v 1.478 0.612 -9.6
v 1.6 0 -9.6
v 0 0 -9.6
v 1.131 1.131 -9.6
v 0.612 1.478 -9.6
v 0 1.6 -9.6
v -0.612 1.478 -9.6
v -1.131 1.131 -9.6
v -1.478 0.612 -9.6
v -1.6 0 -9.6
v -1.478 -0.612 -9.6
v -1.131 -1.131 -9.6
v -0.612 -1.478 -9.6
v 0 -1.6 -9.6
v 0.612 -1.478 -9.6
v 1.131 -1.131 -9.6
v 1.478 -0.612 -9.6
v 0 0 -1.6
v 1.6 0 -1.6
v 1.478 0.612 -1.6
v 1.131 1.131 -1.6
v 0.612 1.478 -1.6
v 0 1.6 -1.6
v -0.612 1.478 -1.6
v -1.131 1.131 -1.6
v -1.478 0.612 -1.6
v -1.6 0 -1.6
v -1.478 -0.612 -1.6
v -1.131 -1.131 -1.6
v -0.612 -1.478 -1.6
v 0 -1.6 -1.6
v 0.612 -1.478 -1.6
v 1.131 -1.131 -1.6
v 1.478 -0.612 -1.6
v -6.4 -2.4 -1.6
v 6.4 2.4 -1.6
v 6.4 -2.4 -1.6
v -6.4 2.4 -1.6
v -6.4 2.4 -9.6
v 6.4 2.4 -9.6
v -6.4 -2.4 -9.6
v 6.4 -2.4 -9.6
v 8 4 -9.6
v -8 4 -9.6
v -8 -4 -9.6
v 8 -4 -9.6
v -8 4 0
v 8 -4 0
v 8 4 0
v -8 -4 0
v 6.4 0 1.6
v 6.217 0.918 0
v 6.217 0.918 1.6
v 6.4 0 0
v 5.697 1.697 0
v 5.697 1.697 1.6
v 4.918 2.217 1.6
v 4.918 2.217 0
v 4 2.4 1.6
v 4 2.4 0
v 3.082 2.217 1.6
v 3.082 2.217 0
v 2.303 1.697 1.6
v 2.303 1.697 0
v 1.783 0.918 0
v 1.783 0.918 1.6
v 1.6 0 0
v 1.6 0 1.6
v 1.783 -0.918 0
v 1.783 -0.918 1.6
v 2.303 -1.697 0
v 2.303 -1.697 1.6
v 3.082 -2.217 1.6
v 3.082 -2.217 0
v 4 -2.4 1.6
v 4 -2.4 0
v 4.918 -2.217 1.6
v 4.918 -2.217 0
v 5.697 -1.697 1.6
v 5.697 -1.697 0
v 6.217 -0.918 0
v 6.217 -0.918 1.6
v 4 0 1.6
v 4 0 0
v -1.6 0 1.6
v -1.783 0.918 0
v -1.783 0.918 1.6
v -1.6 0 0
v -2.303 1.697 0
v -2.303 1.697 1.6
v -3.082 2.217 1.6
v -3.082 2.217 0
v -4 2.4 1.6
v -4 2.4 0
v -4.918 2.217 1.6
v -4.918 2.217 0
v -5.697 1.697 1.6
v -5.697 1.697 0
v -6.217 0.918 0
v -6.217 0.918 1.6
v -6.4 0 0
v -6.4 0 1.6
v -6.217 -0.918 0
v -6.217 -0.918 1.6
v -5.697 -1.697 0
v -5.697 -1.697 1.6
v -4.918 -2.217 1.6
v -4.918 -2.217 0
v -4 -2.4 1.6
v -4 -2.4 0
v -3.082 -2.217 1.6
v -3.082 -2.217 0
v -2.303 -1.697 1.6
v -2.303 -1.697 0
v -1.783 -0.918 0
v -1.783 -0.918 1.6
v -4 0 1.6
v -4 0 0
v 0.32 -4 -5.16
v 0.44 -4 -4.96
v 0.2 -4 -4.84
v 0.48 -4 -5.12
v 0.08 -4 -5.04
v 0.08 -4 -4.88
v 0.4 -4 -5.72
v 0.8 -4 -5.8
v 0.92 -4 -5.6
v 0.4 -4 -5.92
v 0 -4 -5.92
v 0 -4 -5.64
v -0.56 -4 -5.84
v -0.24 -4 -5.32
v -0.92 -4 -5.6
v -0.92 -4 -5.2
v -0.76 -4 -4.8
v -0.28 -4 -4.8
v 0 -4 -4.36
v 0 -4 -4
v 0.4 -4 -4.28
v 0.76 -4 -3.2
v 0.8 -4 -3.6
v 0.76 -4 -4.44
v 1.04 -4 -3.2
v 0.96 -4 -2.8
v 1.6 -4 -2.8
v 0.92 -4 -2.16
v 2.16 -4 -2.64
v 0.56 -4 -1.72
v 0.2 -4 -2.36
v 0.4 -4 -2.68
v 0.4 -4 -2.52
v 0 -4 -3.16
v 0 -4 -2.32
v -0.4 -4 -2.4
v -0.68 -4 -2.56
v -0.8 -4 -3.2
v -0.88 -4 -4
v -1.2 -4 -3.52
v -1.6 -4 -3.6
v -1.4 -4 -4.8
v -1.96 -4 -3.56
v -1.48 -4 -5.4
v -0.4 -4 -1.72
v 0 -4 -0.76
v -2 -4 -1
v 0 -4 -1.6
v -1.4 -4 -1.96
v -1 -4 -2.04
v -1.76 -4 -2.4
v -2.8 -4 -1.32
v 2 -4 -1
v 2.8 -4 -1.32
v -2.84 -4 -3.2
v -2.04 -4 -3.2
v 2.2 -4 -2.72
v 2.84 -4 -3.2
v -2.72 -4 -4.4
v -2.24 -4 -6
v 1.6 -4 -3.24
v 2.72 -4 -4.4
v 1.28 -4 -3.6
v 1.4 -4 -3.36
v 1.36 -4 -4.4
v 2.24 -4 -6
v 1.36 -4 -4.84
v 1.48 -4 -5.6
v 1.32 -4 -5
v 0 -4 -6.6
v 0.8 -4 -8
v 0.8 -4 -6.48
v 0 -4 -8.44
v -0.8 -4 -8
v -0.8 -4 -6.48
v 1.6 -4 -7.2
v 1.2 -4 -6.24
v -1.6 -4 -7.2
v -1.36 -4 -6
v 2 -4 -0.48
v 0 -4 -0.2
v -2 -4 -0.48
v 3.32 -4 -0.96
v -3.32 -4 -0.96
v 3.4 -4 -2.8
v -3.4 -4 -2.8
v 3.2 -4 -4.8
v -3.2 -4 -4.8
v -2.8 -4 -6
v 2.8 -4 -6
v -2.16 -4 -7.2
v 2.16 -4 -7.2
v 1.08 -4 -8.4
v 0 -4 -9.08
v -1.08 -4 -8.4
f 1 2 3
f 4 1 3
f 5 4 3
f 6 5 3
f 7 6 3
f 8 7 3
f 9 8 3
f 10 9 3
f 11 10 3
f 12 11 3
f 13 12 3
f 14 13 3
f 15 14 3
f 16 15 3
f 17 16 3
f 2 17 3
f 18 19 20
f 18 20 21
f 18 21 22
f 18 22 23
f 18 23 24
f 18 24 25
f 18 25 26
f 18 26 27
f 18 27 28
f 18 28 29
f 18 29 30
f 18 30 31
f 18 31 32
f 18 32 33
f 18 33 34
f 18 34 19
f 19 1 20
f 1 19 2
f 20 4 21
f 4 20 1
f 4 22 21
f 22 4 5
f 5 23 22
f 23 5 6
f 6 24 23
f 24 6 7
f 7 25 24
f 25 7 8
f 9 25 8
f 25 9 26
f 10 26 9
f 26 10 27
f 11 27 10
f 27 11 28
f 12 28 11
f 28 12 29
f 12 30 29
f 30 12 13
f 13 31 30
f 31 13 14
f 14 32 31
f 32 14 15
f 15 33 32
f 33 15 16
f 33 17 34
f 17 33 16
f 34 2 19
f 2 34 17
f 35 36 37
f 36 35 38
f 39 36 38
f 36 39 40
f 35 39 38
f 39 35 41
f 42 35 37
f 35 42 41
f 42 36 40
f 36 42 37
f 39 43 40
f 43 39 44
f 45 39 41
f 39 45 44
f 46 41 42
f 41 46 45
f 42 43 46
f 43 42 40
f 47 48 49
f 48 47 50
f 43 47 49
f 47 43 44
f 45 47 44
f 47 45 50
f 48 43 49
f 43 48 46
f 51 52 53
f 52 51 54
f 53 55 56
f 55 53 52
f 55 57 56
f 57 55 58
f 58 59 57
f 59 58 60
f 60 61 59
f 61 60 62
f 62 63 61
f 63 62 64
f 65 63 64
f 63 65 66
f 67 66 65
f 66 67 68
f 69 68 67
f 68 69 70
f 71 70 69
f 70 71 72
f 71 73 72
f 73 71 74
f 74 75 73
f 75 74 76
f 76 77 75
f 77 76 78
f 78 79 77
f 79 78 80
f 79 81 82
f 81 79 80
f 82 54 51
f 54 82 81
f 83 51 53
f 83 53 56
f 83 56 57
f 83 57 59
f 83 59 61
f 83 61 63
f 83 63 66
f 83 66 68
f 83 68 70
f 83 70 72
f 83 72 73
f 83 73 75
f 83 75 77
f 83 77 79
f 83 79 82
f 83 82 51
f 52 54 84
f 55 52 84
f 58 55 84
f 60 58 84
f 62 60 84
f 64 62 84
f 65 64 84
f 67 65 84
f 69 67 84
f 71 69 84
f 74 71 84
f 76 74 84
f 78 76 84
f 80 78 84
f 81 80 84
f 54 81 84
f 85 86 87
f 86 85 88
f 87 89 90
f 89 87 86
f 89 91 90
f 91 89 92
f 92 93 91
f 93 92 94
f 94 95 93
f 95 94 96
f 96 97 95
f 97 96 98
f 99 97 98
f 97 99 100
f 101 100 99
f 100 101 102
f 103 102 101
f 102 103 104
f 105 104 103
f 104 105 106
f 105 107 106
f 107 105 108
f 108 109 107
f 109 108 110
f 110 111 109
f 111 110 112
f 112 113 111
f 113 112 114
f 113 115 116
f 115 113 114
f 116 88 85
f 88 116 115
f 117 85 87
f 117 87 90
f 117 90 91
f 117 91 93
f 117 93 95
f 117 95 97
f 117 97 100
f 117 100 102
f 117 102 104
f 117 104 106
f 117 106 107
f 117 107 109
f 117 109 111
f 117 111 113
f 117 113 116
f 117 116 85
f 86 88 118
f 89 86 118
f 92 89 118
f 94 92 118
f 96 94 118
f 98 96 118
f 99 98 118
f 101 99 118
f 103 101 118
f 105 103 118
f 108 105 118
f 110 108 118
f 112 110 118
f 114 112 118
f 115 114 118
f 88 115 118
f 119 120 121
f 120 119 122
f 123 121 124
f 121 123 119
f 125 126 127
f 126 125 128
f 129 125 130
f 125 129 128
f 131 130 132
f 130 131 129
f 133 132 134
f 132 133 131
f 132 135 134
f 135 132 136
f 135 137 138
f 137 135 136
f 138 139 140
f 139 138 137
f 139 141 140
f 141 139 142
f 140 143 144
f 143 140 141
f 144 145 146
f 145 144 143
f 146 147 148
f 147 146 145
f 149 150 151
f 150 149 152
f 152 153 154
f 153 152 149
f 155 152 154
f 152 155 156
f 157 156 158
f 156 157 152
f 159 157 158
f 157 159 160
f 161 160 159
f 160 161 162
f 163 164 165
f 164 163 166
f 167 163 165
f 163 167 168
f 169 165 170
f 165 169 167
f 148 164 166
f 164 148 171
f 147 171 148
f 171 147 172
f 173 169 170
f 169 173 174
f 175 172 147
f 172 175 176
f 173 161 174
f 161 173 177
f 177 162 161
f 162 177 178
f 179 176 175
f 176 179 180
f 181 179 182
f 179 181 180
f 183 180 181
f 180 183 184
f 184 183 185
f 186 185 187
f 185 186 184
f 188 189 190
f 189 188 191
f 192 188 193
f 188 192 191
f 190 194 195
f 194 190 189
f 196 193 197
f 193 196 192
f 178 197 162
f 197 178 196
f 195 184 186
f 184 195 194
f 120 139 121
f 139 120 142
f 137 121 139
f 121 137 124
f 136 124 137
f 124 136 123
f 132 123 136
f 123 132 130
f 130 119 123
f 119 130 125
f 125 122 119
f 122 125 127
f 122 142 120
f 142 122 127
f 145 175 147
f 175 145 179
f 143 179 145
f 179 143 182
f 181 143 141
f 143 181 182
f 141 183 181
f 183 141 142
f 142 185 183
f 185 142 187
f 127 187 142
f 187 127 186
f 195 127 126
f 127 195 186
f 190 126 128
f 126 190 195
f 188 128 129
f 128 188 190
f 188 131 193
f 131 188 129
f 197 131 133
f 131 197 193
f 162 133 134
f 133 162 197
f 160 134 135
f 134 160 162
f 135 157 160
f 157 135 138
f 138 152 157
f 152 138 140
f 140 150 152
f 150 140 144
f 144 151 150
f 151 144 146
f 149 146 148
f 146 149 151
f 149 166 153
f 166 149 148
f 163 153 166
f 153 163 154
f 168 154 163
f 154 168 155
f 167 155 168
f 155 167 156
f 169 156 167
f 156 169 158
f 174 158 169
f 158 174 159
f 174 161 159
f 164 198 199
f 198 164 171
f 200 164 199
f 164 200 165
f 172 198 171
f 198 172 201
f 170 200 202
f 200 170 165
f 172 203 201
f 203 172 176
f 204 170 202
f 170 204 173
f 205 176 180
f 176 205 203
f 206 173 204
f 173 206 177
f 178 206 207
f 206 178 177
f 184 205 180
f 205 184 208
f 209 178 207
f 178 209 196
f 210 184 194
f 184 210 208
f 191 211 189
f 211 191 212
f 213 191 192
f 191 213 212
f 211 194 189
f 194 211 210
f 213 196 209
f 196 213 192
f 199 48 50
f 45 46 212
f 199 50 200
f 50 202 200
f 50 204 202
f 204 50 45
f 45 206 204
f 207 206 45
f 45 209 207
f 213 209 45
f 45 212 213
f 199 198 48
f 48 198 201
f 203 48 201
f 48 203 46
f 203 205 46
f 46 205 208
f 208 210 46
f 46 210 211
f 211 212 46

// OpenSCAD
// file: ../p/4-4edge.scad
use <../lib.scad>
function ldraw_lib__4_4edge() = [
// 0 Circle 1.0
// 0 Name: 4-4edge.dat
// 0 Author: James Jessiman
// 0 !LDRAW_ORG Primitive UPDATE 2017-01
// 0 !LICENSE Licensed under CC BY 2.0 and CC BY 4.0 : see CAreadme.txt
// 
// 0 BFC CERTIFY CCW
  [0,"BFC","CERTIFY"],
  [0,"BFC","CCW"],
// 
// 0 !HISTORY 1998-12-15 [PTadmin] Official Update 1998-10
// 0 !HISTORY 2005-12-28 [PTadmin] Official Update 2005-01
// 0 !HISTORY 2007-06-24 [PTadmin] Header formatted for Contributor Agreement
// 0 !HISTORY 2008-07-01 [PTadmin] Official Update 2008-01
// 0 !HISTORY 2017-01-15 [Steffen] BFCed
// 0 !HISTORY 2017-12-30 [PTadmin] Official Update 2017-01
// 
// 
// 2 24 1 0 0 0.9239 0 0.3827
  [2,24,1,0,0,0.9239,0,0.3827],
// 2 24 0.9239 0 0.3827 0.7071 0 0.7071
  [2,24,0.9239,0,0.3827,0.7071,0,0.7071],
// 2 24 0.7071 0 0.7071 0.3827 0 0.9239
  [2,24,0.7071,0,0.7071,0.3827,0,0.9239],
// 2 24 0.3827 0 0.9239 0 0 1
  [2,24,0.3827,0,0.9239,0,0,1],
// 2 24 0 0 1 -0.3827 0 0.9239
  [2,24,0,0,1,-0.3827,0,0.9239],
// 2 24 -0.3827 0 0.9239 -0.7071 0 0.7071
  [2,24,-0.3827,0,0.9239,-0.7071,0,0.7071],
// 2 24 -0.7071 0 0.7071 -0.9239 0 0.3827
  [2,24,-0.7071,0,0.7071,-0.9239,0,0.3827],
// 2 24 -0.9239 0 0.3827 -1 0 -0
  [2,24,-0.9239,0,0.3827,-1,0,-0],
// 2 24 -1 0 -0 -0.9239 0 -0.3827
  [2,24,-1,0,-0,-0.9239,0,-0.3827],
// 2 24 -0.9239 0 -0.3827 -0.7071 0 -0.7071
  [2,24,-0.9239,0,-0.3827,-0.7071,0,-0.7071],
// 2 24 -0.7071 0 -0.7071 -0.3827 0 -0.9239
  [2,24,-0.7071,0,-0.7071,-0.3827,0,-0.9239],
// 2 24 -0.3827 0 -0.9239 0 0 -1
  [2,24,-0.3827,0,-0.9239,0,0,-1],
// 2 24 0 0 -1 0.3827 0 -0.9239
  [2,24,0,0,-1,0.3827,0,-0.9239],
// 2 24 0.3827 0 -0.9239 0.7071 0 -0.7071
  [2,24,0.3827,0,-0.9239,0.7071,0,-0.7071],
// 2 24 0.7071 0 -0.7071 0.9239 0 -0.3827
  [2,24,0.7071,0,-0.7071,0.9239,0,-0.3827],
// 2 24 0.9239 0 -0.3827 1 0 0
  [2,24,0.9239,0,-0.3827,1,0,0],
];
module ldraw_lib__4_4edge(step=0, col=false, unit=2/5, alt=false, line=0.2, solid=!$preview)
    makepoly(ldraw_lib__4_4edge(), step=step, col=col, unit=unit, alt=alt, line=line, solid=solid);
ldraw_lib__4_4edge(line=0.2);
// file: ../p/4-4disc.scad
use <../lib.scad>
function ldraw_lib__4_4disc() = [
// 0 Disc 1.0
// 0 Name: 4-4disc.dat
// 0 Author: James Jessiman
// 0 !LDRAW_ORG Primitive UPDATE 2002-02
// 0 !LICENSE Licensed under CC BY 2.0 and CC BY 4.0 : see CAreadme.txt
// 
// 0 BFC CERTIFY CCW
  [0,"BFC","CERTIFY"],
  [0,"BFC","CCW"],
// 
// 0 !HISTORY 1998-12-15 [PTadmin] Official Update 1998-10
// 0 !HISTORY 2002-03-23 [sbliss] Added BFC statement
// 0 !HISTORY 2002-04-25 [PTadmin] Official Update 2002-02
// 0 !HISTORY 2007-06-24 [PTadmin] Header formatted for Contributor Agreement
// 0 !HISTORY 2008-07-01 [PTadmin] Official Update 2008-01
// 
// 
// 3 16 0 0 0 1 0 0 0.9239 0 0.3827
  [3,16,0,0,0,1,0,0,0.9239,0,0.3827],
// 3 16 0 0 0 0.9239 0 0.3827 0.7071 0 0.7071
  [3,16,0,0,0,0.9239,0,0.3827,0.7071,0,0.7071],
// 3 16 0 0 0 0.7071 0 0.7071 0.3827 0 0.9239
  [3,16,0,0,0,0.7071,0,0.7071,0.3827,0,0.9239],
// 3 16 0 0 0 0.3827 0 0.9239 0 0 1
  [3,16,0,0,0,0.3827,0,0.9239,0,0,1],
// 3 16 0 0 0 0 0 1 -0.3827 0 0.9239
  [3,16,0,0,0,0,0,1,-0.3827,0,0.9239],
// 3 16 0 0 0 -0.3827 0 0.9239 -0.7071 0 0.7071
  [3,16,0,0,0,-0.3827,0,0.9239,-0.7071,0,0.7071],
// 3 16 0 0 0 -0.7071 0 0.7071 -0.9239 0 0.3827
  [3,16,0,0,0,-0.7071,0,0.7071,-0.9239,0,0.3827],
// 3 16 0 0 0 -0.9239 0 0.3827 -1 0 -0
  [3,16,0,0,0,-0.9239,0,0.3827,-1,0,-0],
// 3 16 0 0 0 -1 0 -0 -0.9239 0 -0.3827
  [3,16,0,0,0,-1,0,-0,-0.9239,0,-0.3827],
// 3 16 0 0 0 -0.9239 0 -0.3827 -0.7071 0 -0.7071
  [3,16,0,0,0,-0.9239,0,-0.3827,-0.7071,0,-0.7071],
// 3 16 0 0 0 -0.7071 0 -0.7071 -0.3827 0 -0.9239
  [3,16,0,0,0,-0.7071,0,-0.7071,-0.3827,0,-0.9239],
// 3 16 0 0 0 -0.3827 0 -0.9239 0 0 -1
  [3,16,0,0,0,-0.3827,0,-0.9239,0,0,-1],
// 3 16 0 0 0 0 0 -1 0.3827 0 -0.9239
  [3,16,0,0,0,0,0,-1,0.3827,0,-0.9239],
// 3 16 0 0 0 0.3827 0 -0.9239 0.7071 0 -0.7071
  [3,16,0,0,0,0.3827,0,-0.9239,0.7071,0,-0.7071],
// 3 16 0 0 0 0.7071 0 -0.7071 0.9239 0 -0.3827
  [3,16,0,0,0,0.7071,0,-0.7071,0.9239,0,-0.3827],
// 3 16 0 0 0 0.9239 0 -0.3827 1 0 0
  [3,16,0,0,0,0.9239,0,-0.3827,1,0,0],
// 0
];
module ldraw_lib__4_4disc(step=0, col=false, unit=2/5, alt=false, line=0.2, solid=!$preview)
    makepoly(ldraw_lib__4_4disc(), step=step, col=col, unit=unit, alt=alt, line=line, solid=solid);
ldraw_lib__4_4disc(line=0.2);
// file: ../p/4-4cyli.scad
use <../lib.scad>
$fa=1; $fs=0.2;
function ldraw_lib__4_4cyli(realsolid=false) = [
// 0 Cylinder 1.0
// 0 Name: 4-4cyli.dat
// 0 Author: James Jessiman
// 0 !LDRAW_ORG Primitive UPDATE 2005-01
// 0 !LICENSE Licensed under CC BY 2.0 and CC BY 4.0 : see CAreadme.txt
// 
// 0 BFC CERTIFY CCW
  [0,"BFC","CERTIFY"],
  [0,"BFC","CCW"],
// 
// 0 !HISTORY 1998-12-15 [PTadmin] Official Update 1998-10
// 0 !HISTORY 2002-03-23 [sbliss] Added BFC statement; merged headers from files in distributions LDraw 0.27 and Complete.
// 0 !HISTORY 2002-04-25 [PTadmin] Official Update 2002-02
// 0 !HISTORY 2004-12-14 [guyvivan] BFC CCW
// 0 !HISTORY 2005-12-28 [PTadmin] Official Update 2005-01
// 0 !HISTORY 2007-06-24 [PTadmin] Header formatted for Contributor Agreement
// 0 !HISTORY 2008-07-01 [PTadmin] Official Update 2008-01
// 
// 
// 4 16 1 1 0 0.9239 1 0.3827 0.9239 0 0.3827 1 0 0
  [4,16,1,1,0,0.9239,1,0.3827,0.9239,0,0.3827,1,0,0],
// 5 24 1 0 0 1 1 0 0.9239 0 0.3827 0.9239 0 -0.3827
  [5,24,1,0,0,1,1,0,0.9239,0,0.3827,0.9239,0,-0.3827],
// 4 16 0.9239 1 0.3827 0.7071 1 0.7071 0.7071 0 0.7071 0.9239 0 0.3827
  [4,16,0.9239,1,0.3827,0.7071,1,0.7071,0.7071,0,0.7071,0.9239,0,0.3827],
// 5 24 0.9239 0 0.3827 0.9239 1 0.3827 0.7071 0 0.7071 1 0 0
  [5,24,0.9239,0,0.3827,0.9239,1,0.3827,0.7071,0,0.7071,1,0,0],
// 4 16 0.7071 1 0.7071 0.3827 1 0.9239 0.3827 0 0.9239 0.7071 0 0.7071
  [4,16,0.7071,1,0.7071,0.3827,1,0.9239,0.3827,0,0.9239,0.7071,0,0.7071],
// 5 24 0.7071 0 0.7071 0.7071 1 0.7071 0.3827 0 0.9239 0.9239 0 0.3827
  [5,24,0.7071,0,0.7071,0.7071,1,0.7071,0.3827,0,0.9239,0.9239,0,0.3827],
// 4 16 0.3827 1 0.9239 0 1 1 0 0 1 0.3827 0 0.9239
  [4,16,0.3827,1,0.9239,0,1,1,0,0,1,0.3827,0,0.9239],
// 5 24 0.3827 0 0.9239 0.3827 1 0.9239 0 0 1 0.7071 0 0.7071
  [5,24,0.3827,0,0.9239,0.3827,1,0.9239,0,0,1,0.7071,0,0.7071],
// 4 16 0 1 1 -0.3827 1 0.9239 -0.3827 0 0.9239 0 0 1
  [4,16,0,1,1,-0.3827,1,0.9239,-0.3827,0,0.9239,0,0,1],
// 5 24 0 0 1 0 1 1 -0.3827 0 0.9239 0.3827 0 0.9239
  [5,24,0,0,1,0,1,1,-0.3827,0,0.9239,0.3827,0,0.9239],
// 4 16 -0.3827 1 0.9239 -0.7071 1 0.7071 -0.7071 0 0.7071 -0.3827 0 0.9239
  [4,16,-0.3827,1,0.9239,-0.7071,1,0.7071,-0.7071,0,0.7071,-0.3827,0,0.9239],
// 5 24 -0.3827 0 0.9239 -0.3827 1 0.9239 -0.7071 0 0.7071 0 0 1
  [5,24,-0.3827,0,0.9239,-0.3827,1,0.9239,-0.7071,0,0.7071,0,0,1],
// 4 16 -0.7071 1 0.7071 -0.9239 1 0.3827 -0.9239 0 0.3827 -0.7071 0 0.7071
  [4,16,-0.7071,1,0.7071,-0.9239,1,0.3827,-0.9239,0,0.3827,-0.7071,0,0.7071],
// 5 24 -0.7071 0 0.7071 -0.7071 1 0.7071 -0.9239 0 0.3827 -0.3827 0 0.9239
  [5,24,-0.7071,0,0.7071,-0.7071,1,0.7071,-0.9239,0,0.3827,-0.3827,0,0.9239],
// 4 16 -0.9239 1 0.3827 -1 1 0 -1 0 0 -0.9239 0 0.3827
  [4,16,-0.9239,1,0.3827,-1,1,0,-1,0,0,-0.9239,0,0.3827],
// 5 24 -0.9239 0 0.3827 -0.9239 1 0.3827 -1 0 0 -0.7071 0 0.7071
  [5,24,-0.9239,0,0.3827,-0.9239,1,0.3827,-1,0,0,-0.7071,0,0.7071],
// 4 16 -1 1 0 -0.9239 1 -0.3827 -0.9239 0 -0.3827 -1 0 0
  [4,16,-1,1,0,-0.9239,1,-0.3827,-0.9239,0,-0.3827,-1,0,0],
// 5 24 -1 0 0 -1 1 0 -0.9239 0 -0.3827 -0.9239 0 0.3827
  [5,24,-1,0,0,-1,1,0,-0.9239,0,-0.3827,-0.9239,0,0.3827],
// 4 16 -0.9239 1 -0.3827 -0.7071 1 -0.7071 -0.7071 0 -0.7071 -0.9239 0 -0.3827
  [4,16,-0.9239,1,-0.3827,-0.7071,1,-0.7071,-0.7071,0,-0.7071,-0.9239,0,-0.3827],
// 5 24 -0.9239 0 -0.3827 -0.9239 1 -0.3827 -0.7071 0 -0.7071 -1 0 0
  [5,24,-0.9239,0,-0.3827,-0.9239,1,-0.3827,-0.7071,0,-0.7071,-1,0,0],
// 4 16 -0.7071 1 -0.7071 -0.3827 1 -0.9239 -0.3827 0 -0.9239 -0.7071 0 -0.7071
  [4,16,-0.7071,1,-0.7071,-0.3827,1,-0.9239,-0.3827,0,-0.9239,-0.7071,0,-0.7071],
// 5 24 -0.7071 0 -0.7071 -0.7071 1 -0.7071 -0.3827 0 -0.9239 -0.9239 0 -0.3827
  [5,24,-0.7071,0,-0.7071,-0.7071,1,-0.7071,-0.3827,0,-0.9239,-0.9239,0,-0.3827],
// 4 16 -0.3827 1 -0.9239 0 1 -1 0 0 -1 -0.3827 0 -0.9239
  [4,16,-0.3827,1,-0.9239,0,1,-1,0,0,-1,-0.3827,0,-0.9239],
// 5 24 -0.3827 0 -0.9239 -0.3827 1 -0.9239 0 0 -1 -0.7071 0 -0.7071
  [5,24,-0.3827,0,-0.9239,-0.3827,1,-0.9239,0,0,-1,-0.7071,0,-0.7071],
// 4 16 0 1 -1 0.3827 1 -0.9239 0.3827 0 -0.9239 0 0 -1
  [4,16,0,1,-1,0.3827,1,-0.9239,0.3827,0,-0.9239,0,0,-1],
// 5 24 0 0 -1 0 1 -1 0.3827 0 -0.9239 -0.3827 0 -0.9239
  [5,24,0,0,-1,0,1,-1,0.3827,0,-0.9239,-0.3827,0,-0.9239],
// 4 16 0.3827 1 -0.9239 0.7071 1 -0.7071 0.7071 0 -0.7071 0.3827 0 -0.9239
  [4,16,0.3827,1,-0.9239,0.7071,1,-0.7071,0.7071,0,-0.7071,0.3827,0,-0.9239],
// 5 24 0.3827 0 -0.9239 0.3827 1 -0.9239 0.7071 0 -0.7071 0 0 -1
  [5,24,0.3827,0,-0.9239,0.3827,1,-0.9239,0.7071,0,-0.7071,0,0,-1],
// 4 16 0.7071 1 -0.7071 0.9239 1 -0.3827 0.9239 0 -0.3827 0.7071 0 -0.7071
  [4,16,0.7071,1,-0.7071,0.9239,1,-0.3827,0.9239,0,-0.3827,0.7071,0,-0.7071],
// 5 24 0.7071 0 -0.7071 0.7071 1 -0.7071 0.9239 0 -0.3827 0.3827 0 -0.9239
  [5,24,0.7071,0,-0.7071,0.7071,1,-0.7071,0.9239,0,-0.3827,0.3827,0,-0.9239],
// 4 16 0.9239 1 -0.3827 1 1 0 1 0 0 0.9239 0 -0.3827
  [4,16,0.9239,1,-0.3827,1,1,0,1,0,0,0.9239,0,-0.3827],
// 5 24 0.9239 0 -0.3827 0.9239 1 -0.3827 1 0 0 0.7071 0 -0.7071
  [5,24,0.9239,0,-0.3827,0.9239,1,-0.3827,1,0,0,0.7071,0,-0.7071],
// 0
];
module ldraw_lib__4_4cyli(step=0, col=false, unit=2/5, alt=false, line=0.2, solid=!$preview)
    makepoly(ldraw_lib__4_4cyli(solid), step=step, col=col, unit=unit, alt=alt, line=line, solid=solid);
ldraw_lib__4_4cyli(line=0.2);
// file: ../p/stud3.scad
use <../lib.scad>
use <4-4cyli.scad>
use <4-4disc.scad>
use <4-4edge.scad>
function ldraw_lib__stud3() = [
// 0 Stud Tube Solid
// 0 Name: stud3.dat
// 0 Author: James Jessiman
// 0 !LDRAW_ORG Primitive UPDATE 2012-01
// 0 !LICENSE Licensed under CC BY 4.0 : see CAreadme.txt
// 
// 0 BFC CERTIFY CCW
  [0,"BFC","CERTIFY"],
  [0,"BFC","CCW"],
// 
// 0 !HISTORY 2002-04-04 [sbliss] Modified for BFC compliance
// 0 !HISTORY 2002-04-25 [PTadmin] Official Update 2002-02
// 0 !HISTORY 2007-06-24 [PTadmin] Header formatted for Contributor Agreement
// 0 !HISTORY 2008-07-01 [PTadmin] Official Update 2008-01
// 0 !HISTORY 2012-02-16 [Philo] Changed to CCW
// 0 !HISTORY 2012-03-30 [PTadmin] Official Update 2012-01
// 
// 
// 1 16 0 -4 0 4 0 0 0 1 0 0 0 4 4-4edge.dat
  [1,16,0,-4,0,4,0,0,0,1,0,0,0,4, ldraw_lib__4_4edge()],
// 1 16 0 0 0 4 0 0 0 1 0 0 0 4 4-4edge.dat
  [1,16,0,0,0,4,0,0,0,1,0,0,0,4, ldraw_lib__4_4edge()],
// 1 16 0 -4 0 4 0 0 0 1 0 0 0 4 4-4disc.dat
  [1,16,0,-4,0,4,0,0,0,1,0,0,0,4, ldraw_lib__4_4disc()],
  [-1,16,0,0,0,4,0,0,0,-1,0,0,0,4, ldraw_lib__4_4disc()],
// 1 16 0 -4 0 4 0 0 0 4 0 0 0 4 4-4cyli.dat
  [1,16,0,-4,0,4,0,0,0,4,0,0,0,4, ldraw_lib__4_4cyli()],
];
module ldraw_lib__stud3(step=0, col=false, unit=2/5, alt=false, line=0.2, solid=!$preview)
    makepoly(ldraw_lib__stud3(), step=step, col=col, unit=unit, alt=alt, line=line, solid=solid);
ldraw_lib__stud3(line=0.2);
// file: ../p/stud.scad
use <../lib.scad>
use <4-4cyli.scad>
use <4-4disc.scad>
use <4-4edge.scad>
function ldraw_lib__stud() = [
// 0 Stud
// 0 Name: stud.dat
// 0 Author: James Jessiman
// 0 !LDRAW_ORG Primitive UPDATE 2012-01
// 0 !LICENSE Licensed under CC BY 4.0 : see CAreadme.txt
// 
// 0 BFC CERTIFY CCW
  [0,"BFC","CERTIFY"],
  [0,"BFC","CCW"],
// 
// 0 !HISTORY 2002-04-04 [sbliss] Modified for BFC compliance
// 0 !HISTORY 2002-04-25 [PTadmin] Official Update 2002-02
// 0 !HISTORY 2007-06-24 [PTadmin] Header formatted for Contributor Agreement
// 0 !HISTORY 2008-07-01 [PTadmin] Official Update 2008-01
// 0 !HISTORY 2012-02-16 [Philo] Changed to CCW
// 0 !HISTORY 2012-03-30 [PTadmin] Official Update 2012-01
// 
// 
// 1 16 0 0 0 6 0 0 0 1 0 0 0 6 4-4edge.dat
  [1,16,0,0,0,6,0,0,0,1,0,0,0,6, ldraw_lib__4_4edge()],
// 1 16 0 -4 0 6 0 0 0 1 0 0 0 6 4-4edge.dat
  [1,16,0,-4,0,6,0,0,0,1,0,0,0,6, ldraw_lib__4_4edge()],
// 1 16 0 0 0 6 0 0 0 -4 0 0 0 6 4-4cyli.dat
  [1,16,0,0,0,6,0,0,0,-4,0,0,0,6, ldraw_lib__4_4cyli()],
// 1 16 0 -4 0 6 0 0 0 1 0 0 0 6 4-4disc.dat
  [1,16,0,-4,0,6,0,0,0,1,0,0,0,6, ldraw_lib__4_4disc()],
  [-1,16,0,0,0,6,0,0,0,-1,0,0,0,6, ldraw_lib__4_4disc()],
];
module ldraw_lib__stud(step=0, col=false, unit=2/5, alt=false, line=0.2, solid=!$preview)
    makepoly(ldraw_lib__stud(), step=step, col=col, unit=unit, alt=alt, line=line, solid=solid);
ldraw_lib__stud(line=0.2);
// file: ../p/box5.scad
use <../lib.scad>
function ldraw_lib__box5() = [
// 0 Box with 5 Faces and All Edges
// 0 Name: box5.dat
// 0 Author: James Jessiman
// 0 !LDRAW_ORG Primitive UPDATE 2012-01
// 0 !LICENSE Licensed under CC BY 2.0 and CC BY 4.0 : see CAreadme.txt
// 
// 0 BFC CERTIFY CCW
  [0,"BFC","CERTIFY"],
  [0,"BFC","CCW"],
// 
// 0 !HISTORY 2002-04-03 [sbliss] Modified for BFC compliance
// 0 !HISTORY 2002-04-25 [PTadmin] Official Update 2002-02
// 0 !HISTORY 2007-06-24 [PTadmin] Header formatted for Contributor Agreement
// 0 !HISTORY 2008-07-01 [PTadmin] Official Update 2008-01
// 0 !HISTORY 2012-02-16 [Philo] Changed to CCW
// 0 !HISTORY 2012-03-30 [PTadmin] Official Update 2012-01
// 
// 
// 2 24 1 1 1 -1 1 1
  [2,24,1,1,1,-1,1,1],
// 2 24 -1 1 1 -1 1 -1
  [2,24,-1,1,1,-1,1,-1],
// 2 24 -1 1 -1 1 1 -1
  [2,24,-1,1,-1,1,1,-1],
// 2 24 1 1 -1 1 1 1
  [2,24,1,1,-1,1,1,1],
// 2 24 1 0 1 -1 0 1
  [2,24,1,0,1,-1,0,1],
// 2 24 -1 0 1 -1 0 -1
  [2,24,-1,0,1,-1,0,-1],
// 2 24 -1 0 -1 1 0 -1
  [2,24,-1,0,-1,1,0,-1],
// 2 24 1 0 -1 1 0 1
  [2,24,1,0,-1,1,0,1],
// 2 24 1 0 1 1 1 1
  [2,24,1,0,1,1,1,1],
// 2 24 -1 0 1 -1 1 1
  [2,24,-1,0,1,-1,1,1],
// 2 24 1 0 -1 1 1 -1
  [2,24,1,0,-1,1,1,-1],
// 2 24 -1 0 -1 -1 1 -1
  [2,24,-1,0,-1,-1,1,-1],
// 4 16 -1 1 1 1 1 1 1 1 -1 -1 1 -1
  [4,16,-1,1,1,1,1,1,1,1,-1,-1,1,-1],
// 4 16 -1 1 1 -1 0 1 1 0 1 1 1 1
  [4,16,-1,1,1,-1,0,1,1,0,1,1,1,1],
// 4 16 -1 1 -1 -1 0 -1 -1 0 1 -1 1 1
  [4,16,-1,1,-1,-1,0,-1,-1,0,1,-1,1,1],
// 4 16 1 1 -1 1 0 -1 -1 0 -1 -1 1 -1
  [4,16,1,1,-1,1,0,-1,-1,0,-1,-1,1,-1],
// 4 16 1 1 1 1 0 1 1 0 -1 1 1 -1
  [4,16,1,1,1,1,0,1,1,0,-1,1,1,-1],
];
makepoly(ldraw_lib__box5(), line=0.2);
// file: ../p/box4t.scad
use <../lib.scad>
function ldraw_lib__box4t() = [
// 0 Box with 4 Adjacent Faces and All Edges
// 0 Name: box4t.dat
// 0 Author: Tore Eriksson [Tore_Eriksson]
// 0 !LDRAW_ORG Primitive UPDATE 2003-02
// 0 !LICENSE Licensed under CC BY 2.0 and CC BY 4.0 : see CAreadme.txt
// 
// 0 BFC CERTIFY CCW
  [0,"BFC","CERTIFY"],
  [0,"BFC","CCW"],
// 
// 0 !HISTORY 1997-09-29 [PTadmin] Official Update 1997-15
// 0 !HISTORY 2002-08-31 [izanette] Modified with WINDZ for BFC compliance
// 0 !HISTORY 2003-08-01 [PTadmin] Official Update 2003-02
// 0 !HISTORY 2007-06-24 [PTadmin] Header formatted for Contributor Agreement
// 0 !HISTORY 2008-07-01 [PTadmin] Official Update 2008-01
// 
// 
// 2 24 1 1 1 -1 1 1
  [2,24,1,1,1,-1,1,1],
// 2 24 -1 1 1 -1 1 -1
  [2,24,-1,1,1,-1,1,-1],
// 2 24 -1 1 -1 1 1 -1
  [2,24,-1,1,-1,1,1,-1],
// 2 24 1 1 -1 1 1 1
  [2,24,1,1,-1,1,1,1],
// 2 24 1 0 1 -1 0 1
  [2,24,1,0,1,-1,0,1],
// 2 24 -1 0 1 -1 0 -1
  [2,24,-1,0,1,-1,0,-1],
// 2 24 -1 0 -1 1 0 -1
  [2,24,-1,0,-1,1,0,-1],
// 2 24 1 0 -1 1 0 1
  [2,24,1,0,-1,1,0,1],
// 2 24 1 0 1 1 1 1
  [2,24,1,0,1,1,1,1],
// 2 24 -1 0 1 -1 1 1
  [2,24,-1,0,1,-1,1,1],
// 2 24 1 0 -1 1 1 -1
  [2,24,1,0,-1,1,1,-1],
// 2 24 -1 0 -1 -1 1 -1
  [2,24,-1,0,-1,-1,1,-1],
// 4 16 1 1 1 1 1 -1 -1 1 -1 -1 1 1
  [4,16,1,1,1,1,1,-1,-1,1,-1,-1,1,1],
// 4 16 1 1 1 -1 1 1 -1 0 1 1 0 1
  [4,16,1,1,1,-1,1,1,-1,0,1,1,0,1],
// 4 16 -1 1 1 -1 1 -1 -1 0 -1 -1 0 1
  [4,16,-1,1,1,-1,1,-1,-1,0,-1,-1,0,1],
// 0 4 16 -1 1 -1 -1 0 -1 1 0 -1 1 1 -1
// 4 16 1 1 -1 1 1 1 1 0 1 1 0 -1
  [4,16,1,1,-1,1,1,1,1,0,1,1,0,-1],
// 0
];
makepoly(ldraw_lib__box4t(), line=0.2);
// file: s/3004s01.scad
use <../../lib.scad>
use <../../p/box4t.scad>
use <../../p/box5.scad>
use <../../p/stud.scad>
use <../../p/stud3.scad>
$fa=1; $fs=0.2;
function ldraw_lib__s__3004s01(realsolid=false) = [
// 0 ~Brick  1 x  2 without Front Face
// 0 Name: s\3004s01.dat
// 0 Author: James Jessiman
// 0 !LDRAW_ORG Subpart UPDATE 2003-03
// 0 !LICENSE Licensed under CC BY 2.0 and CC BY 4.0 : see CAreadme.txt
// 
// 0 BFC CERTIFY CCW
  [0,"BFC","CERTIFY"],
  [0,"BFC","CCW"],
// 
// 0 !HISTORY 2003-09-07 [jriley] Subfiling, BFC
// 0 !HISTORY 2003-12-19 [PTadmin] Official Update 2003-03
// 0 !HISTORY 2007-08-29 [PTadmin] Header formatted for Contributor Agreement
// 0 !HISTORY 2008-07-01 [PTadmin] Official Update 2008-01
// 
// 
// 1 16 0 4 0 1 0 0 0 -5 0 0 0 1 stud3.dat
  [1,16,0,4,0,1,0,0,0,-5,0,0,0,1, ldraw_lib__stud3(realsolid)],
// 0 BFC INVERTNEXT
  [0,"BFC","INVERTNEXT"],
// 1 16 0 24 0 16 0 0 0 -20 0 0 0 6 box5.dat
  [1,16,0,24,0,16,0,0,0,-20,0,0,0,6, ldraw_lib__box5(realsolid)],
// 4 16 20 24 10 16 24 6 -16 24 6 -20 24 10
  [4,16,20,24,10,16,24,6,-16,24,6,-20,24,10],
// 4 16 -20 24 10 -16 24 6 -16 24 -6 -20 24 -10
  [4,16,-20,24,10,-16,24,6,-16,24,-6,-20,24,-10],
// 4 16 -20 24 -10 -16 24 -6 16 24 -6 20 24 -10
  [4,16,-20,24,-10,-16,24,-6,16,24,-6,20,24,-10],
// 4 16 20 24 -10 16 24 -6 16 24 6 20 24 10
  [4,16,20,24,-10,16,24,-6,16,24,6,20,24,10],
// 1 16 0 24 0 20 0 0 0 -24 0 0 0 10 box4t.dat
  [1,16,0,24,0,20,0,0,0,-24,0,0,0,10, ldraw_lib__box4t(realsolid)],
// 1 16 10 0 0 1 0 0 0 1 0 0 0 1 stud.dat
  [1,16,10,0,0,1,0,0,0,1,0,0,0,1, ldraw_lib__stud(realsolid)],
// 1 16 -10 0 0 1 0 0 0 1 0 0 0 1 stud.dat
  [1,16,-10,0,0,1,0,0,0,1,0,0,0,1, ldraw_lib__stud(realsolid)],
// 0
];
module ldraw_lib__s__3004s01(step=0, col=false, unit=2/5, alt=false, line=0.2, solid=!$preview)
    makepoly(ldraw_lib__s__3004s01(solid), step=step, col=col, unit=unit, alt=alt, line=line, solid=solid);
ldraw_lib__s__3004s01(line=0.2);
// main file
use <../lib.scad>
use <s/3004s01.scad>
function ldraw_lib__3004ph2() = [
// 0 Brick  1 x  2 with Silver Snake on Green Shield Pattern
// 0 Name: 3004ph2.dat
// 0 Author: Andy Westrate [westrate]
// 0 !LDRAW_ORG Part UPDATE 2013-01
// 0 !LICENSE Licensed under CC BY 4.0 : see CAreadme.txt
// 
// 0 BFC CERTIFY CCW
  [0,"BFC","CERTIFY"],
  [0,"BFC","CCW"],
// 
// 0 !KEYWORDS BrickLink 3004px10, Coat of Arms, Harry Potter
// 0 !KEYWORDS Hogwarts School of Witchcraft and Wizardry, Rebrickable 3004pr9956
// 0 !KEYWORDS Salazar Syltherin, Slytherin House
// 
// 0 !CMDLINE -c2
// 
// 0 !HISTORY 2009-07-01 [Eldar] Change color 258 to 288 and inline files
// 0 !HISTORY 2009-09-03 [PTadmin] Official Update 2009-02
// 0 !HISTORY 2013-03-02 [MagFors] Changed colour 383 to 80 (printed silver)
// 0 !HISTORY 2013-07-21 [PTadmin] Official Update 2013-01
// 
// 
// 1 16 0 0 0 1 0 0 0 1 0 0 0 1 s\3004s01.dat
  [1,16,0,0,0,1,0,0,0,1,0,0,0,1, ldraw_lib__s__3004s01()],
// 4 288 1.2 12.8 -10 1.1 12.4 -10 0.5 12.1 -10 0.8 12.9 -10
  [4,288,1.2,12.8,-10,1.1,12.4,-10,0.5,12.1,-10,0.8,12.9,-10],
// 4 288 0.8 12.9 -10 0.5 12.1 -10 0.2 12.2 -10 0.2 12.6 -10
  [4,288,0.8,12.9,-10,0.5,12.1,-10,0.2,12.2,-10,0.2,12.6,-10],
// 4 288 2 14.5 -10 2.3 14 -10 1 14.3 -10 1 14.8 -10
  [4,288,2,14.5,-10,2.3,14,-10,1,14.3,-10,1,14.8,-10],
// 4 288 1 14.8 -10 1 14.3 -10 0 14.1 -10 0 14.8 -10
  [4,288,1,14.8,-10,1,14.3,-10,0,14.1,-10,0,14.8,-10],
// 4 288 0 14.8 -10 0 14.1 -10 -0.6 13.3 -10 -1.4 14.6 -10
  [4,288,0,14.8,-10,0,14.1,-10,-0.6,13.3,-10,-1.4,14.6,-10],
// 4 288 -1.4 14.6 -10 -0.6 13.3 -10 -2.3 13 -10 -2.3 14 -10
  [4,288,-1.4,14.6,-10,-0.6,13.3,-10,-2.3,13,-10,-2.3,14,-10],
// 4 288 -2.3 13 -10 -0.6 13.3 -10 -0.7 12 -10 -1.9 12 -10
  [4,288,-2.3,13,-10,-0.6,13.3,-10,-0.7,12,-10,-1.9,12,-10],
// 4 288 -1.9 12 -10 -0.7 12 -10 0 10.9 -10 0 10 -10
  [4,288,-1.9,12,-10,-0.7,12,-10,0,10.9,-10,0,10,-10],
// 4 288 0 10.9 -10 1 10.7 -10 1.9 8 -10 0 10 -10
  [4,288,0,10.9,-10,1,10.7,-10,1.9,8,-10,0,10,-10],
// 4 288 1.9 11.1 -10 2 9 -10 1.9 8 -10 1 10.7 -10
  [4,288,1.9,11.1,-10,2,9,-10,1.9,8,-10,1,10.7,-10],
// 4 288 2 9 -10 2.6 8 -10 2.4 7 -10 1.9 8 -10
  [4,288,2,9,-10,2.6,8,-10,2.4,7,-10,1.9,8,-10],
// 4 288 2.3 5.4 -10 2.4 7 -10 2.6 8 -10 4 7 -10
  [4,288,2.3,5.4,-10,2.4,7,-10,2.6,8,-10,4,7,-10],
// 4 288 4 7 -10 5.4 6.6 -10 1.4 4.3 -10 2.3 5.4 -10
  [4,288,4,7,-10,5.4,6.6,-10,1.4,4.3,-10,2.3,5.4,-10],
// 4 288 1 6.7 -10 1 6.3 -10 0.5 5.9 -10 0 7.9 -10
  [4,288,1,6.7,-10,1,6.3,-10,0.5,5.9,-10,0,7.9,-10],
// 4 288 0 7.9 -10 0.5 5.9 -10 0 5.8 -10 -1 6 -10
  [4,288,0,7.9,-10,0.5,5.9,-10,0,5.8,-10,-1,6,-10],
// 4 288 -1 6 -10 -1.7 6.4 -10 -2 8 -10 0 7.9 -10
  [4,288,-1,6,-10,-1.7,6.4,-10,-2,8,-10,0,7.9,-10],
// 4 288 -3 8.8 -10 -2.2 10 -10 0 7.9 -10 -2 8 -10
  [4,288,-3,8.8,-10,-2.2,10,-10,0,7.9,-10,-2,8,-10],
// 4 288 -2.2 10 -10 -3 8.8 -10 -4 9 -10 -3.5 12 -10
  [4,288,-2.2,10,-10,-3,8.8,-10,-4,9,-10,-3.5,12,-10],
// 4 288 -3.5 12 -10 -4 9 -10 -4.9 8.9 -10 -3.7 13.5 -10
  [4,288,-3.5,12,-10,-4,9,-10,-4.9,8.9,-10,-3.7,13.5,-10],
// 4 288 -1 4.3 -10 0 4 -10 0 1.9 -10 -5 2.5 -10
  [4,288,-1,4.3,-10,0,4,-10,0,1.9,-10,-5,2.5,-10],
// 4 288 -2.5 5.1 -10 -1 4.3 -10 -5 2.5 -10 -3.5 4.9 -10
  [4,288,-2.5,5.1,-10,-1,4.3,-10,-5,2.5,-10,-3.5,4.9,-10],
// 4 288 -7 3.3 -10 -4.4 6 -10 -3.5 4.9 -10 -5 2.5 -10
  [4,288,-7,3.3,-10,-4.4,6,-10,-3.5,4.9,-10,-5,2.5,-10],
// 4 288 5 2.5 -10 0 1.9 -10 0 4 -10 1.4 4.3 -10
  [4,288,5,2.5,-10,0,1.9,-10,0,4,-10,1.4,4.3,-10],
// 4 288 1.4 4.3 -10 5.4 6.6 -10 7 3.3 -10 5 2.5 -10
  [4,288,1.4,4.3,-10,5.4,6.6,-10,7,3.3,-10,5,2.5,-10],
// 4 288 -5.1 8 -10 -4.4 6 -10 -7 3.3 -10 -7.1 8 -10
  [4,288,-5.1,8,-10,-4.4,6,-10,-7,3.3,-10,-7.1,8,-10],
// 4 288 5.4 6.6 -10 5.5 6.8 -10 7.1 8 -10 7 3.3 -10
  [4,288,5.4,6.6,-10,5.5,6.8,-10,7.1,8,-10,7,3.3,-10],
// 4 288 -4.9 8.9 -10 -5.1 8 -10 -7.1 8 -10 -6.8 11 -10
  [4,288,-4.9,8.9,-10,-5.1,8,-10,-7.1,8,-10,-6.8,11,-10],
// 4 288 -6.8 11 -10 -5.6 15 -10 -3.7 13.5 -10 -4.9 8.9 -10
  [4,288,-6.8,11,-10,-5.6,15,-10,-3.7,13.5,-10,-4.9,8.9,-10],
// 4 288 6.8 11 -10 7.1 8 -10 5.5 6.8 -10 4 8.1 -10
  [4,288,6.8,11,-10,7.1,8,-10,5.5,6.8,-10,4,8.1,-10],
// 4 288 6.8 11 -10 4 8.1 -10 3.5 8.4 -10 3.2 9 -10
  [4,288,6.8,11,-10,4,8.1,-10,3.5,8.4,-10,3.2,9,-10],
// 4 288 5.6 15 -10 6.8 11 -10 3.2 9 -10 3.4 11 -10
  [4,288,5.6,15,-10,6.8,11,-10,3.2,9,-10,3.4,11,-10],
// 3 288 5.6 15 -10 3.4 11 -10 3.4 12.1 -10
  [3,288,5.6,15,-10,3.4,11,-10,3.4,12.1,-10],
// 4 288 5.6 15 -10 3.4 12.1 -10 3.3 12.5 -10 3.7 14 -10
  [4,288,5.6,15,-10,3.4,12.1,-10,3.3,12.5,-10,3.7,14,-10],
// 4 288 0 16.5 -10 0 21.1 -10 2 20 -10 2 16.2 -10
  [4,288,0,16.5,-10,0,21.1,-10,2,20,-10,2,16.2,-10],
// 4 288 0 21.1 -10 0 16.5 -10 -2 16.2 -10 -2 20 -10
  [4,288,0,21.1,-10,0,16.5,-10,-2,16.2,-10,-2,20,-10],
// 4 288 4 18 -10 3 15.6 -10 2 16.2 -10 2 20 -10
  [4,288,4,18,-10,3,15.6,-10,2,16.2,-10,2,20,-10],
// 4 288 -4 18 -10 -2 20 -10 -2 16.2 -10 -3.4 15 -10
  [4,288,-4,18,-10,-2,20,-10,-2,16.2,-10,-3.4,15,-10],
// 4 288 -3.4 15 -10 -3.7 13.5 -10 -5.6 15 -10 -4 18 -10
  [4,288,-3.4,15,-10,-3.7,13.5,-10,-5.6,15,-10,-4,18,-10],
// 4 288 3.7 14 -10 3 15.6 -10 4 18 -10 5.6 15 -10
  [4,288,3.7,14,-10,3,15.6,-10,4,18,-10,5.6,15,-10],
// 4 80 0.5 12.1 -10 1.1 12.4 -10 1.9 11.1 -10 1 10.7 -10
  [4,80,0.5,12.1,-10,1.1,12.4,-10,1.9,11.1,-10,1,10.7,-10],
// 4 80 1 10.7 -10 0 10.9 -10 0.2 12.2 -10 0.5 12.1 -10
  [4,80,1,10.7,-10,0,10.9,-10,0.2,12.2,-10,0.5,12.1,-10],
// 4 80 0.2 12.6 -10 0.2 12.2 -10 0 10.9 -10 -0.7 12 -10
  [4,80,0.2,12.6,-10,0.2,12.2,-10,0,10.9,-10,-0.7,12,-10],
// 4 80 -0.7 12 -10 -0.6 13.3 -10 0 14.1 -10 0.2 12.6 -10
  [4,80,-0.7,12,-10,-0.6,13.3,-10,0,14.1,-10,0.2,12.6,-10],
// 4 80 1 14.3 -10 0.8 12.9 -10 0.2 12.6 -10 0 14.1 -10
  [4,80,1,14.3,-10,0.8,12.9,-10,0.2,12.6,-10,0,14.1,-10],
// 4 80 2.3 14 -10 1.2 12.8 -10 0.8 12.9 -10 1 14.3 -10
  [4,80,2.3,14,-10,1.2,12.8,-10,0.8,12.9,-10,1,14.3,-10],
// 4 80 2.3 14 -10 1.9 11.1 -10 1.1 12.4 -10 1.2 12.8 -10
  [4,80,2.3,14,-10,1.9,11.1,-10,1.1,12.4,-10,1.2,12.8,-10],
// 4 80 4 8.1 -10 5.5 6.8 -10 5.4 6.6 -10 4 7 -10
  [4,80,4,8.1,-10,5.5,6.8,-10,5.4,6.6,-10,4,7,-10],
// 4 80 4 7 -10 2.6 8 -10 3.5 8.4 -10 4 8.1 -10
  [4,80,4,7,-10,2.6,8,-10,3.5,8.4,-10,4,8.1,-10],
// 4 80 3.5 8.4 -10 2.6 8 -10 2 9 -10 3.2 9 -10
  [4,80,3.5,8.4,-10,2.6,8,-10,2,9,-10,3.2,9,-10],
// 4 80 1.9 11.1 -10 3.4 11 -10 3.2 9 -10 2 9 -10
  [4,80,1.9,11.1,-10,3.4,11,-10,3.2,9,-10,2,9,-10],
// 4 80 3.3 12.5 -10 3.4 12.1 -10 3.4 11 -10 1.9 11.1 -10
  [4,80,3.3,12.5,-10,3.4,12.1,-10,3.4,11,-10,1.9,11.1,-10],
// 4 80 3.7 14 -10 3.3 12.5 -10 1.9 11.1 -10 2.3 14 -10
  [4,80,3.7,14,-10,3.3,12.5,-10,1.9,11.1,-10,2.3,14,-10],
// 4 80 2.3 14 -10 2 14.5 -10 3 15.6 -10 3.7 14 -10
  [4,80,2.3,14,-10,2,14.5,-10,3,15.6,-10,3.7,14,-10],
// 4 80 2 14.5 -10 1 14.8 -10 2 16.2 -10 3 15.6 -10
  [4,80,2,14.5,-10,1,14.8,-10,2,16.2,-10,3,15.6,-10],
// 4 80 1 14.8 -10 0 14.8 -10 0 16.5 -10 2 16.2 -10
  [4,80,1,14.8,-10,0,14.8,-10,0,16.5,-10,2,16.2,-10],
// 4 80 0 14.8 -10 -1.4 14.6 -10 -2 16.2 -10 0 16.5 -10
  [4,80,0,14.8,-10,-1.4,14.6,-10,-2,16.2,-10,0,16.5,-10],
// 4 80 -1.4 14.6 -10 -2.3 14 -10 -3.4 15 -10 -2 16.2 -10
  [4,80,-1.4,14.6,-10,-2.3,14,-10,-3.4,15,-10,-2,16.2,-10],
// 4 80 -3.4 15 -10 -2.3 14 -10 -2.3 13 -10 -3.7 13.5 -10
  [4,80,-3.4,15,-10,-2.3,14,-10,-2.3,13,-10,-3.7,13.5,-10],
// 4 80 -1.9 12 -10 -3.5 12 -10 -3.7 13.5 -10 -2.3 13 -10
  [4,80,-1.9,12,-10,-3.5,12,-10,-3.7,13.5,-10,-2.3,13,-10],
// 4 80 -1.9 12 -10 0 10 -10 -2.2 10 -10 -3.5 12 -10
  [4,80,-1.9,12,-10,0,10,-10,-2.2,10,-10,-3.5,12,-10],
// 4 80 1.9 8 -10 0 7.9 -10 -2.2 10 -10 0 10 -10
  [4,80,1.9,8,-10,0,7.9,-10,-2.2,10,-10,0,10,-10],
// 4 80 2.4 7 -10 1 6.7 -10 0 7.9 -10 1.9 8 -10
  [4,80,2.4,7,-10,1,6.7,-10,0,7.9,-10,1.9,8,-10],
// 4 80 2.4 7 -10 2.3 5.4 -10 1 6.3 -10 1 6.7 -10
  [4,80,2.4,7,-10,2.3,5.4,-10,1,6.3,-10,1,6.7,-10],
// 4 80 2.3 5.4 -10 1.4 4.3 -10 0.5 5.9 -10 1 6.3 -10
  [4,80,2.3,5.4,-10,1.4,4.3,-10,0.5,5.9,-10,1,6.3,-10],
// 4 80 0 4 -10 0 5.8 -10 0.5 5.9 -10 1.4 4.3 -10
  [4,80,0,4,-10,0,5.8,-10,0.5,5.9,-10,1.4,4.3,-10],
// 4 80 -1 6 -10 0 5.8 -10 0 4 -10 -1 4.3 -10
  [4,80,-1,6,-10,0,5.8,-10,0,4,-10,-1,4.3,-10],
// 4 80 -2.5 5.1 -10 -1.7 6.4 -10 -1 6 -10 -1 4.3 -10
  [4,80,-2.5,5.1,-10,-1.7,6.4,-10,-1,6,-10,-1,4.3,-10],
// 4 80 -2.5 5.1 -10 -3.5 4.9 -10 -2 8 -10 -1.7 6.4 -10
  [4,80,-2.5,5.1,-10,-3.5,4.9,-10,-2,8,-10,-1.7,6.4,-10],
// 4 80 -4.4 6 -10 -3 8.8 -10 -2 8 -10 -3.5 4.9 -10
  [4,80,-4.4,6,-10,-3,8.8,-10,-2,8,-10,-3.5,4.9,-10],
// 4 80 -3 8.8 -10 -4.4 6 -10 -5.1 8 -10 -4 9 -10
  [4,80,-3,8.8,-10,-4.4,6,-10,-5.1,8,-10,-4,9,-10],
// 3 80 -5.1 8 -10 -4.9 8.9 -10 -4 9 -10
  [3,80,-5.1,8,-10,-4.9,8.9,-10,-4,9,-10],
// 4 0 0 .5 -10 0 1.9 -10 5 2.5 -10 5 1.2 -10
  [4,0,0,.5,-10,0,1.9,-10,5,2.5,-10,5,1.2,-10],
// 4 0 -5 2.5 -10 0 1.9 -10 0 .5 -10 -5 1.2 -10
  [4,0,-5,2.5,-10,0,1.9,-10,0,.5,-10,-5,1.2,-10],
// 4 0 7 3.3 -10 8.3 2.4 -10 5 1.2 -10 5 2.5 -10
  [4,0,7,3.3,-10,8.3,2.4,-10,5,1.2,-10,5,2.5,-10],
// 4 0 -7 3.3 -10 -5 2.5 -10 -5 1.2 -10 -8.3 2.4 -10
  [4,0,-7,3.3,-10,-5,2.5,-10,-5,1.2,-10,-8.3,2.4,-10],
// 4 0 8.3 2.4 -10 7 3.3 -10 7.1 8 -10 8.5 7 -10
  [4,0,8.3,2.4,-10,7,3.3,-10,7.1,8,-10,8.5,7,-10],
// 4 0 -7 3.3 -10 -8.3 2.4 -10 -8.5 7 -10 -7.1 8 -10
  [4,0,-7,3.3,-10,-8.3,2.4,-10,-8.5,7,-10,-7.1,8,-10],
// 4 0 8.5 7 -10 7.1 8 -10 6.8 11 -10 8 12 -10
  [4,0,8.5,7,-10,7.1,8,-10,6.8,11,-10,8,12,-10],
// 4 0 -7.1 8 -10 -8.5 7 -10 -8 12 -10 -6.8 11 -10
  [4,0,-7.1,8,-10,-8.5,7,-10,-8,12,-10,-6.8,11,-10],
// 4 0 -7 15 -10 -5.6 15 -10 -6.8 11 -10 -8 12 -10
  [4,0,-7,15,-10,-5.6,15,-10,-6.8,11,-10,-8,12,-10],
// 4 0 8 12 -10 6.8 11 -10 5.6 15 -10 7 15 -10
  [4,0,8,12,-10,6.8,11,-10,5.6,15,-10,7,15,-10],
// 4 0 -7 15 -10 -5.4 18 -10 -4 18 -10 -5.6 15 -10
  [4,0,-7,15,-10,-5.4,18,-10,-4,18,-10,-5.6,15,-10],
// 4 0 5.4 18 -10 7 15 -10 5.6 15 -10 4 18 -10
  [4,0,5.4,18,-10,7,15,-10,5.6,15,-10,4,18,-10],
// 4 0 0 21.1 -10 0 22.7 -10 2.7 21 -10 2 20 -10
  [4,0,0,21.1,-10,0,22.7,-10,2.7,21,-10,2,20,-10],
// 4 0 -2.7 21 -10 0 22.7 -10 0 21.1 -10 -2 20 -10
  [4,0,-2.7,21,-10,0,22.7,-10,0,21.1,-10,-2,20,-10],
// 4 0 4 18 -10 2 20 -10 2.7 21 -10 5.4 18 -10
  [4,0,4,18,-10,2,20,-10,2.7,21,-10,5.4,18,-10],
// 4 0 -5.4 18 -10 -2.7 21 -10 -2 20 -10 -4 18 -10
  [4,0,-5.4,18,-10,-2.7,21,-10,-2,20,-10,-4,18,-10],
// 3 16 0 .5 -10 20 0 -10 -20 0 -10
  [3,16,0,.5,-10,20,0,-10,-20,0,-10],
// 3 16 -20 24 -10 20 24 -10 0 22.7 -10
  [3,16,-20,24,-10,20,24,-10,0,22.7,-10],
// 3 16 0 .5 -10 -20 0 -10 -5 1.2 -10
  [3,16,0,.5,-10,-20,0,-10,-5,1.2,-10],
// 3 16 -20 0 -10 -8.3 2.4 -10 -5 1.2 -10
  [3,16,-20,0,-10,-8.3,2.4,-10,-5,1.2,-10],
// 4 16 -8.3 2.4 -10 -20 0 -10 -20 24 -10 -8.5 7 -10
  [4,16,-8.3,2.4,-10,-20,0,-10,-20,24,-10,-8.5,7,-10],
// 3 16 -20 24 -10 -8 12 -10 -8.5 7 -10
  [3,16,-20,24,-10,-8,12,-10,-8.5,7,-10],
// 3 16 -7 15 -10 -8 12 -10 -20 24 -10
  [3,16,-7,15,-10,-8,12,-10,-20,24,-10],
// 3 16 -20 24 -10 -5.4 18 -10 -7 15 -10
  [3,16,-20,24,-10,-5.4,18,-10,-7,15,-10],
// 3 16 -2.7 21 -10 -5.4 18 -10 -20 24 -10
  [3,16,-2.7,21,-10,-5.4,18,-10,-20,24,-10],
// 3 16 -20 24 -10 0 22.7 -10 -2.7 21 -10
  [3,16,-20,24,-10,0,22.7,-10,-2.7,21,-10],
// 3 16 0 .5 -10 5 1.2 -10 20 0 -10
  [3,16,0,.5,-10,5,1.2,-10,20,0,-10],
// 3 16 20 0 -10 5 1.2 -10 8.3 2.4 -10
  [3,16,20,0,-10,5,1.2,-10,8.3,2.4,-10],
// 4 16 20 0 -10 8.3 2.4 -10 8.5 7 -10 20 24 -10
  [4,16,20,0,-10,8.3,2.4,-10,8.5,7,-10,20,24,-10],
// 3 16 8.5 7 -10 8 12 -10 20 24 -10
  [3,16,8.5,7,-10,8,12,-10,20,24,-10],
// 3 16 20 24 -10 8 12 -10 7 15 -10
  [3,16,20,24,-10,8,12,-10,7,15,-10],
// 3 16 7 15 -10 5.4 18 -10 20 24 -10
  [3,16,7,15,-10,5.4,18,-10,20,24,-10],
// 3 16 20 24 -10 5.4 18 -10 2.7 21 -10
  [3,16,20,24,-10,5.4,18,-10,2.7,21,-10],
// 3 16 2.7 21 -10 0 22.7 -10 20 24 -10
  [3,16,2.7,21,-10,0,22.7,-10,20,24,-10],
];
module ldraw_lib__3004ph2(step=0, col=false, unit=2/5, alt=false, line=0.2, solid=!$preview)
    makepoly(ldraw_lib__3004ph2(), step=step, col=col, unit=unit, alt=alt, line=line, solid=solid);
ldraw_lib__3004ph2(line=0.2);
